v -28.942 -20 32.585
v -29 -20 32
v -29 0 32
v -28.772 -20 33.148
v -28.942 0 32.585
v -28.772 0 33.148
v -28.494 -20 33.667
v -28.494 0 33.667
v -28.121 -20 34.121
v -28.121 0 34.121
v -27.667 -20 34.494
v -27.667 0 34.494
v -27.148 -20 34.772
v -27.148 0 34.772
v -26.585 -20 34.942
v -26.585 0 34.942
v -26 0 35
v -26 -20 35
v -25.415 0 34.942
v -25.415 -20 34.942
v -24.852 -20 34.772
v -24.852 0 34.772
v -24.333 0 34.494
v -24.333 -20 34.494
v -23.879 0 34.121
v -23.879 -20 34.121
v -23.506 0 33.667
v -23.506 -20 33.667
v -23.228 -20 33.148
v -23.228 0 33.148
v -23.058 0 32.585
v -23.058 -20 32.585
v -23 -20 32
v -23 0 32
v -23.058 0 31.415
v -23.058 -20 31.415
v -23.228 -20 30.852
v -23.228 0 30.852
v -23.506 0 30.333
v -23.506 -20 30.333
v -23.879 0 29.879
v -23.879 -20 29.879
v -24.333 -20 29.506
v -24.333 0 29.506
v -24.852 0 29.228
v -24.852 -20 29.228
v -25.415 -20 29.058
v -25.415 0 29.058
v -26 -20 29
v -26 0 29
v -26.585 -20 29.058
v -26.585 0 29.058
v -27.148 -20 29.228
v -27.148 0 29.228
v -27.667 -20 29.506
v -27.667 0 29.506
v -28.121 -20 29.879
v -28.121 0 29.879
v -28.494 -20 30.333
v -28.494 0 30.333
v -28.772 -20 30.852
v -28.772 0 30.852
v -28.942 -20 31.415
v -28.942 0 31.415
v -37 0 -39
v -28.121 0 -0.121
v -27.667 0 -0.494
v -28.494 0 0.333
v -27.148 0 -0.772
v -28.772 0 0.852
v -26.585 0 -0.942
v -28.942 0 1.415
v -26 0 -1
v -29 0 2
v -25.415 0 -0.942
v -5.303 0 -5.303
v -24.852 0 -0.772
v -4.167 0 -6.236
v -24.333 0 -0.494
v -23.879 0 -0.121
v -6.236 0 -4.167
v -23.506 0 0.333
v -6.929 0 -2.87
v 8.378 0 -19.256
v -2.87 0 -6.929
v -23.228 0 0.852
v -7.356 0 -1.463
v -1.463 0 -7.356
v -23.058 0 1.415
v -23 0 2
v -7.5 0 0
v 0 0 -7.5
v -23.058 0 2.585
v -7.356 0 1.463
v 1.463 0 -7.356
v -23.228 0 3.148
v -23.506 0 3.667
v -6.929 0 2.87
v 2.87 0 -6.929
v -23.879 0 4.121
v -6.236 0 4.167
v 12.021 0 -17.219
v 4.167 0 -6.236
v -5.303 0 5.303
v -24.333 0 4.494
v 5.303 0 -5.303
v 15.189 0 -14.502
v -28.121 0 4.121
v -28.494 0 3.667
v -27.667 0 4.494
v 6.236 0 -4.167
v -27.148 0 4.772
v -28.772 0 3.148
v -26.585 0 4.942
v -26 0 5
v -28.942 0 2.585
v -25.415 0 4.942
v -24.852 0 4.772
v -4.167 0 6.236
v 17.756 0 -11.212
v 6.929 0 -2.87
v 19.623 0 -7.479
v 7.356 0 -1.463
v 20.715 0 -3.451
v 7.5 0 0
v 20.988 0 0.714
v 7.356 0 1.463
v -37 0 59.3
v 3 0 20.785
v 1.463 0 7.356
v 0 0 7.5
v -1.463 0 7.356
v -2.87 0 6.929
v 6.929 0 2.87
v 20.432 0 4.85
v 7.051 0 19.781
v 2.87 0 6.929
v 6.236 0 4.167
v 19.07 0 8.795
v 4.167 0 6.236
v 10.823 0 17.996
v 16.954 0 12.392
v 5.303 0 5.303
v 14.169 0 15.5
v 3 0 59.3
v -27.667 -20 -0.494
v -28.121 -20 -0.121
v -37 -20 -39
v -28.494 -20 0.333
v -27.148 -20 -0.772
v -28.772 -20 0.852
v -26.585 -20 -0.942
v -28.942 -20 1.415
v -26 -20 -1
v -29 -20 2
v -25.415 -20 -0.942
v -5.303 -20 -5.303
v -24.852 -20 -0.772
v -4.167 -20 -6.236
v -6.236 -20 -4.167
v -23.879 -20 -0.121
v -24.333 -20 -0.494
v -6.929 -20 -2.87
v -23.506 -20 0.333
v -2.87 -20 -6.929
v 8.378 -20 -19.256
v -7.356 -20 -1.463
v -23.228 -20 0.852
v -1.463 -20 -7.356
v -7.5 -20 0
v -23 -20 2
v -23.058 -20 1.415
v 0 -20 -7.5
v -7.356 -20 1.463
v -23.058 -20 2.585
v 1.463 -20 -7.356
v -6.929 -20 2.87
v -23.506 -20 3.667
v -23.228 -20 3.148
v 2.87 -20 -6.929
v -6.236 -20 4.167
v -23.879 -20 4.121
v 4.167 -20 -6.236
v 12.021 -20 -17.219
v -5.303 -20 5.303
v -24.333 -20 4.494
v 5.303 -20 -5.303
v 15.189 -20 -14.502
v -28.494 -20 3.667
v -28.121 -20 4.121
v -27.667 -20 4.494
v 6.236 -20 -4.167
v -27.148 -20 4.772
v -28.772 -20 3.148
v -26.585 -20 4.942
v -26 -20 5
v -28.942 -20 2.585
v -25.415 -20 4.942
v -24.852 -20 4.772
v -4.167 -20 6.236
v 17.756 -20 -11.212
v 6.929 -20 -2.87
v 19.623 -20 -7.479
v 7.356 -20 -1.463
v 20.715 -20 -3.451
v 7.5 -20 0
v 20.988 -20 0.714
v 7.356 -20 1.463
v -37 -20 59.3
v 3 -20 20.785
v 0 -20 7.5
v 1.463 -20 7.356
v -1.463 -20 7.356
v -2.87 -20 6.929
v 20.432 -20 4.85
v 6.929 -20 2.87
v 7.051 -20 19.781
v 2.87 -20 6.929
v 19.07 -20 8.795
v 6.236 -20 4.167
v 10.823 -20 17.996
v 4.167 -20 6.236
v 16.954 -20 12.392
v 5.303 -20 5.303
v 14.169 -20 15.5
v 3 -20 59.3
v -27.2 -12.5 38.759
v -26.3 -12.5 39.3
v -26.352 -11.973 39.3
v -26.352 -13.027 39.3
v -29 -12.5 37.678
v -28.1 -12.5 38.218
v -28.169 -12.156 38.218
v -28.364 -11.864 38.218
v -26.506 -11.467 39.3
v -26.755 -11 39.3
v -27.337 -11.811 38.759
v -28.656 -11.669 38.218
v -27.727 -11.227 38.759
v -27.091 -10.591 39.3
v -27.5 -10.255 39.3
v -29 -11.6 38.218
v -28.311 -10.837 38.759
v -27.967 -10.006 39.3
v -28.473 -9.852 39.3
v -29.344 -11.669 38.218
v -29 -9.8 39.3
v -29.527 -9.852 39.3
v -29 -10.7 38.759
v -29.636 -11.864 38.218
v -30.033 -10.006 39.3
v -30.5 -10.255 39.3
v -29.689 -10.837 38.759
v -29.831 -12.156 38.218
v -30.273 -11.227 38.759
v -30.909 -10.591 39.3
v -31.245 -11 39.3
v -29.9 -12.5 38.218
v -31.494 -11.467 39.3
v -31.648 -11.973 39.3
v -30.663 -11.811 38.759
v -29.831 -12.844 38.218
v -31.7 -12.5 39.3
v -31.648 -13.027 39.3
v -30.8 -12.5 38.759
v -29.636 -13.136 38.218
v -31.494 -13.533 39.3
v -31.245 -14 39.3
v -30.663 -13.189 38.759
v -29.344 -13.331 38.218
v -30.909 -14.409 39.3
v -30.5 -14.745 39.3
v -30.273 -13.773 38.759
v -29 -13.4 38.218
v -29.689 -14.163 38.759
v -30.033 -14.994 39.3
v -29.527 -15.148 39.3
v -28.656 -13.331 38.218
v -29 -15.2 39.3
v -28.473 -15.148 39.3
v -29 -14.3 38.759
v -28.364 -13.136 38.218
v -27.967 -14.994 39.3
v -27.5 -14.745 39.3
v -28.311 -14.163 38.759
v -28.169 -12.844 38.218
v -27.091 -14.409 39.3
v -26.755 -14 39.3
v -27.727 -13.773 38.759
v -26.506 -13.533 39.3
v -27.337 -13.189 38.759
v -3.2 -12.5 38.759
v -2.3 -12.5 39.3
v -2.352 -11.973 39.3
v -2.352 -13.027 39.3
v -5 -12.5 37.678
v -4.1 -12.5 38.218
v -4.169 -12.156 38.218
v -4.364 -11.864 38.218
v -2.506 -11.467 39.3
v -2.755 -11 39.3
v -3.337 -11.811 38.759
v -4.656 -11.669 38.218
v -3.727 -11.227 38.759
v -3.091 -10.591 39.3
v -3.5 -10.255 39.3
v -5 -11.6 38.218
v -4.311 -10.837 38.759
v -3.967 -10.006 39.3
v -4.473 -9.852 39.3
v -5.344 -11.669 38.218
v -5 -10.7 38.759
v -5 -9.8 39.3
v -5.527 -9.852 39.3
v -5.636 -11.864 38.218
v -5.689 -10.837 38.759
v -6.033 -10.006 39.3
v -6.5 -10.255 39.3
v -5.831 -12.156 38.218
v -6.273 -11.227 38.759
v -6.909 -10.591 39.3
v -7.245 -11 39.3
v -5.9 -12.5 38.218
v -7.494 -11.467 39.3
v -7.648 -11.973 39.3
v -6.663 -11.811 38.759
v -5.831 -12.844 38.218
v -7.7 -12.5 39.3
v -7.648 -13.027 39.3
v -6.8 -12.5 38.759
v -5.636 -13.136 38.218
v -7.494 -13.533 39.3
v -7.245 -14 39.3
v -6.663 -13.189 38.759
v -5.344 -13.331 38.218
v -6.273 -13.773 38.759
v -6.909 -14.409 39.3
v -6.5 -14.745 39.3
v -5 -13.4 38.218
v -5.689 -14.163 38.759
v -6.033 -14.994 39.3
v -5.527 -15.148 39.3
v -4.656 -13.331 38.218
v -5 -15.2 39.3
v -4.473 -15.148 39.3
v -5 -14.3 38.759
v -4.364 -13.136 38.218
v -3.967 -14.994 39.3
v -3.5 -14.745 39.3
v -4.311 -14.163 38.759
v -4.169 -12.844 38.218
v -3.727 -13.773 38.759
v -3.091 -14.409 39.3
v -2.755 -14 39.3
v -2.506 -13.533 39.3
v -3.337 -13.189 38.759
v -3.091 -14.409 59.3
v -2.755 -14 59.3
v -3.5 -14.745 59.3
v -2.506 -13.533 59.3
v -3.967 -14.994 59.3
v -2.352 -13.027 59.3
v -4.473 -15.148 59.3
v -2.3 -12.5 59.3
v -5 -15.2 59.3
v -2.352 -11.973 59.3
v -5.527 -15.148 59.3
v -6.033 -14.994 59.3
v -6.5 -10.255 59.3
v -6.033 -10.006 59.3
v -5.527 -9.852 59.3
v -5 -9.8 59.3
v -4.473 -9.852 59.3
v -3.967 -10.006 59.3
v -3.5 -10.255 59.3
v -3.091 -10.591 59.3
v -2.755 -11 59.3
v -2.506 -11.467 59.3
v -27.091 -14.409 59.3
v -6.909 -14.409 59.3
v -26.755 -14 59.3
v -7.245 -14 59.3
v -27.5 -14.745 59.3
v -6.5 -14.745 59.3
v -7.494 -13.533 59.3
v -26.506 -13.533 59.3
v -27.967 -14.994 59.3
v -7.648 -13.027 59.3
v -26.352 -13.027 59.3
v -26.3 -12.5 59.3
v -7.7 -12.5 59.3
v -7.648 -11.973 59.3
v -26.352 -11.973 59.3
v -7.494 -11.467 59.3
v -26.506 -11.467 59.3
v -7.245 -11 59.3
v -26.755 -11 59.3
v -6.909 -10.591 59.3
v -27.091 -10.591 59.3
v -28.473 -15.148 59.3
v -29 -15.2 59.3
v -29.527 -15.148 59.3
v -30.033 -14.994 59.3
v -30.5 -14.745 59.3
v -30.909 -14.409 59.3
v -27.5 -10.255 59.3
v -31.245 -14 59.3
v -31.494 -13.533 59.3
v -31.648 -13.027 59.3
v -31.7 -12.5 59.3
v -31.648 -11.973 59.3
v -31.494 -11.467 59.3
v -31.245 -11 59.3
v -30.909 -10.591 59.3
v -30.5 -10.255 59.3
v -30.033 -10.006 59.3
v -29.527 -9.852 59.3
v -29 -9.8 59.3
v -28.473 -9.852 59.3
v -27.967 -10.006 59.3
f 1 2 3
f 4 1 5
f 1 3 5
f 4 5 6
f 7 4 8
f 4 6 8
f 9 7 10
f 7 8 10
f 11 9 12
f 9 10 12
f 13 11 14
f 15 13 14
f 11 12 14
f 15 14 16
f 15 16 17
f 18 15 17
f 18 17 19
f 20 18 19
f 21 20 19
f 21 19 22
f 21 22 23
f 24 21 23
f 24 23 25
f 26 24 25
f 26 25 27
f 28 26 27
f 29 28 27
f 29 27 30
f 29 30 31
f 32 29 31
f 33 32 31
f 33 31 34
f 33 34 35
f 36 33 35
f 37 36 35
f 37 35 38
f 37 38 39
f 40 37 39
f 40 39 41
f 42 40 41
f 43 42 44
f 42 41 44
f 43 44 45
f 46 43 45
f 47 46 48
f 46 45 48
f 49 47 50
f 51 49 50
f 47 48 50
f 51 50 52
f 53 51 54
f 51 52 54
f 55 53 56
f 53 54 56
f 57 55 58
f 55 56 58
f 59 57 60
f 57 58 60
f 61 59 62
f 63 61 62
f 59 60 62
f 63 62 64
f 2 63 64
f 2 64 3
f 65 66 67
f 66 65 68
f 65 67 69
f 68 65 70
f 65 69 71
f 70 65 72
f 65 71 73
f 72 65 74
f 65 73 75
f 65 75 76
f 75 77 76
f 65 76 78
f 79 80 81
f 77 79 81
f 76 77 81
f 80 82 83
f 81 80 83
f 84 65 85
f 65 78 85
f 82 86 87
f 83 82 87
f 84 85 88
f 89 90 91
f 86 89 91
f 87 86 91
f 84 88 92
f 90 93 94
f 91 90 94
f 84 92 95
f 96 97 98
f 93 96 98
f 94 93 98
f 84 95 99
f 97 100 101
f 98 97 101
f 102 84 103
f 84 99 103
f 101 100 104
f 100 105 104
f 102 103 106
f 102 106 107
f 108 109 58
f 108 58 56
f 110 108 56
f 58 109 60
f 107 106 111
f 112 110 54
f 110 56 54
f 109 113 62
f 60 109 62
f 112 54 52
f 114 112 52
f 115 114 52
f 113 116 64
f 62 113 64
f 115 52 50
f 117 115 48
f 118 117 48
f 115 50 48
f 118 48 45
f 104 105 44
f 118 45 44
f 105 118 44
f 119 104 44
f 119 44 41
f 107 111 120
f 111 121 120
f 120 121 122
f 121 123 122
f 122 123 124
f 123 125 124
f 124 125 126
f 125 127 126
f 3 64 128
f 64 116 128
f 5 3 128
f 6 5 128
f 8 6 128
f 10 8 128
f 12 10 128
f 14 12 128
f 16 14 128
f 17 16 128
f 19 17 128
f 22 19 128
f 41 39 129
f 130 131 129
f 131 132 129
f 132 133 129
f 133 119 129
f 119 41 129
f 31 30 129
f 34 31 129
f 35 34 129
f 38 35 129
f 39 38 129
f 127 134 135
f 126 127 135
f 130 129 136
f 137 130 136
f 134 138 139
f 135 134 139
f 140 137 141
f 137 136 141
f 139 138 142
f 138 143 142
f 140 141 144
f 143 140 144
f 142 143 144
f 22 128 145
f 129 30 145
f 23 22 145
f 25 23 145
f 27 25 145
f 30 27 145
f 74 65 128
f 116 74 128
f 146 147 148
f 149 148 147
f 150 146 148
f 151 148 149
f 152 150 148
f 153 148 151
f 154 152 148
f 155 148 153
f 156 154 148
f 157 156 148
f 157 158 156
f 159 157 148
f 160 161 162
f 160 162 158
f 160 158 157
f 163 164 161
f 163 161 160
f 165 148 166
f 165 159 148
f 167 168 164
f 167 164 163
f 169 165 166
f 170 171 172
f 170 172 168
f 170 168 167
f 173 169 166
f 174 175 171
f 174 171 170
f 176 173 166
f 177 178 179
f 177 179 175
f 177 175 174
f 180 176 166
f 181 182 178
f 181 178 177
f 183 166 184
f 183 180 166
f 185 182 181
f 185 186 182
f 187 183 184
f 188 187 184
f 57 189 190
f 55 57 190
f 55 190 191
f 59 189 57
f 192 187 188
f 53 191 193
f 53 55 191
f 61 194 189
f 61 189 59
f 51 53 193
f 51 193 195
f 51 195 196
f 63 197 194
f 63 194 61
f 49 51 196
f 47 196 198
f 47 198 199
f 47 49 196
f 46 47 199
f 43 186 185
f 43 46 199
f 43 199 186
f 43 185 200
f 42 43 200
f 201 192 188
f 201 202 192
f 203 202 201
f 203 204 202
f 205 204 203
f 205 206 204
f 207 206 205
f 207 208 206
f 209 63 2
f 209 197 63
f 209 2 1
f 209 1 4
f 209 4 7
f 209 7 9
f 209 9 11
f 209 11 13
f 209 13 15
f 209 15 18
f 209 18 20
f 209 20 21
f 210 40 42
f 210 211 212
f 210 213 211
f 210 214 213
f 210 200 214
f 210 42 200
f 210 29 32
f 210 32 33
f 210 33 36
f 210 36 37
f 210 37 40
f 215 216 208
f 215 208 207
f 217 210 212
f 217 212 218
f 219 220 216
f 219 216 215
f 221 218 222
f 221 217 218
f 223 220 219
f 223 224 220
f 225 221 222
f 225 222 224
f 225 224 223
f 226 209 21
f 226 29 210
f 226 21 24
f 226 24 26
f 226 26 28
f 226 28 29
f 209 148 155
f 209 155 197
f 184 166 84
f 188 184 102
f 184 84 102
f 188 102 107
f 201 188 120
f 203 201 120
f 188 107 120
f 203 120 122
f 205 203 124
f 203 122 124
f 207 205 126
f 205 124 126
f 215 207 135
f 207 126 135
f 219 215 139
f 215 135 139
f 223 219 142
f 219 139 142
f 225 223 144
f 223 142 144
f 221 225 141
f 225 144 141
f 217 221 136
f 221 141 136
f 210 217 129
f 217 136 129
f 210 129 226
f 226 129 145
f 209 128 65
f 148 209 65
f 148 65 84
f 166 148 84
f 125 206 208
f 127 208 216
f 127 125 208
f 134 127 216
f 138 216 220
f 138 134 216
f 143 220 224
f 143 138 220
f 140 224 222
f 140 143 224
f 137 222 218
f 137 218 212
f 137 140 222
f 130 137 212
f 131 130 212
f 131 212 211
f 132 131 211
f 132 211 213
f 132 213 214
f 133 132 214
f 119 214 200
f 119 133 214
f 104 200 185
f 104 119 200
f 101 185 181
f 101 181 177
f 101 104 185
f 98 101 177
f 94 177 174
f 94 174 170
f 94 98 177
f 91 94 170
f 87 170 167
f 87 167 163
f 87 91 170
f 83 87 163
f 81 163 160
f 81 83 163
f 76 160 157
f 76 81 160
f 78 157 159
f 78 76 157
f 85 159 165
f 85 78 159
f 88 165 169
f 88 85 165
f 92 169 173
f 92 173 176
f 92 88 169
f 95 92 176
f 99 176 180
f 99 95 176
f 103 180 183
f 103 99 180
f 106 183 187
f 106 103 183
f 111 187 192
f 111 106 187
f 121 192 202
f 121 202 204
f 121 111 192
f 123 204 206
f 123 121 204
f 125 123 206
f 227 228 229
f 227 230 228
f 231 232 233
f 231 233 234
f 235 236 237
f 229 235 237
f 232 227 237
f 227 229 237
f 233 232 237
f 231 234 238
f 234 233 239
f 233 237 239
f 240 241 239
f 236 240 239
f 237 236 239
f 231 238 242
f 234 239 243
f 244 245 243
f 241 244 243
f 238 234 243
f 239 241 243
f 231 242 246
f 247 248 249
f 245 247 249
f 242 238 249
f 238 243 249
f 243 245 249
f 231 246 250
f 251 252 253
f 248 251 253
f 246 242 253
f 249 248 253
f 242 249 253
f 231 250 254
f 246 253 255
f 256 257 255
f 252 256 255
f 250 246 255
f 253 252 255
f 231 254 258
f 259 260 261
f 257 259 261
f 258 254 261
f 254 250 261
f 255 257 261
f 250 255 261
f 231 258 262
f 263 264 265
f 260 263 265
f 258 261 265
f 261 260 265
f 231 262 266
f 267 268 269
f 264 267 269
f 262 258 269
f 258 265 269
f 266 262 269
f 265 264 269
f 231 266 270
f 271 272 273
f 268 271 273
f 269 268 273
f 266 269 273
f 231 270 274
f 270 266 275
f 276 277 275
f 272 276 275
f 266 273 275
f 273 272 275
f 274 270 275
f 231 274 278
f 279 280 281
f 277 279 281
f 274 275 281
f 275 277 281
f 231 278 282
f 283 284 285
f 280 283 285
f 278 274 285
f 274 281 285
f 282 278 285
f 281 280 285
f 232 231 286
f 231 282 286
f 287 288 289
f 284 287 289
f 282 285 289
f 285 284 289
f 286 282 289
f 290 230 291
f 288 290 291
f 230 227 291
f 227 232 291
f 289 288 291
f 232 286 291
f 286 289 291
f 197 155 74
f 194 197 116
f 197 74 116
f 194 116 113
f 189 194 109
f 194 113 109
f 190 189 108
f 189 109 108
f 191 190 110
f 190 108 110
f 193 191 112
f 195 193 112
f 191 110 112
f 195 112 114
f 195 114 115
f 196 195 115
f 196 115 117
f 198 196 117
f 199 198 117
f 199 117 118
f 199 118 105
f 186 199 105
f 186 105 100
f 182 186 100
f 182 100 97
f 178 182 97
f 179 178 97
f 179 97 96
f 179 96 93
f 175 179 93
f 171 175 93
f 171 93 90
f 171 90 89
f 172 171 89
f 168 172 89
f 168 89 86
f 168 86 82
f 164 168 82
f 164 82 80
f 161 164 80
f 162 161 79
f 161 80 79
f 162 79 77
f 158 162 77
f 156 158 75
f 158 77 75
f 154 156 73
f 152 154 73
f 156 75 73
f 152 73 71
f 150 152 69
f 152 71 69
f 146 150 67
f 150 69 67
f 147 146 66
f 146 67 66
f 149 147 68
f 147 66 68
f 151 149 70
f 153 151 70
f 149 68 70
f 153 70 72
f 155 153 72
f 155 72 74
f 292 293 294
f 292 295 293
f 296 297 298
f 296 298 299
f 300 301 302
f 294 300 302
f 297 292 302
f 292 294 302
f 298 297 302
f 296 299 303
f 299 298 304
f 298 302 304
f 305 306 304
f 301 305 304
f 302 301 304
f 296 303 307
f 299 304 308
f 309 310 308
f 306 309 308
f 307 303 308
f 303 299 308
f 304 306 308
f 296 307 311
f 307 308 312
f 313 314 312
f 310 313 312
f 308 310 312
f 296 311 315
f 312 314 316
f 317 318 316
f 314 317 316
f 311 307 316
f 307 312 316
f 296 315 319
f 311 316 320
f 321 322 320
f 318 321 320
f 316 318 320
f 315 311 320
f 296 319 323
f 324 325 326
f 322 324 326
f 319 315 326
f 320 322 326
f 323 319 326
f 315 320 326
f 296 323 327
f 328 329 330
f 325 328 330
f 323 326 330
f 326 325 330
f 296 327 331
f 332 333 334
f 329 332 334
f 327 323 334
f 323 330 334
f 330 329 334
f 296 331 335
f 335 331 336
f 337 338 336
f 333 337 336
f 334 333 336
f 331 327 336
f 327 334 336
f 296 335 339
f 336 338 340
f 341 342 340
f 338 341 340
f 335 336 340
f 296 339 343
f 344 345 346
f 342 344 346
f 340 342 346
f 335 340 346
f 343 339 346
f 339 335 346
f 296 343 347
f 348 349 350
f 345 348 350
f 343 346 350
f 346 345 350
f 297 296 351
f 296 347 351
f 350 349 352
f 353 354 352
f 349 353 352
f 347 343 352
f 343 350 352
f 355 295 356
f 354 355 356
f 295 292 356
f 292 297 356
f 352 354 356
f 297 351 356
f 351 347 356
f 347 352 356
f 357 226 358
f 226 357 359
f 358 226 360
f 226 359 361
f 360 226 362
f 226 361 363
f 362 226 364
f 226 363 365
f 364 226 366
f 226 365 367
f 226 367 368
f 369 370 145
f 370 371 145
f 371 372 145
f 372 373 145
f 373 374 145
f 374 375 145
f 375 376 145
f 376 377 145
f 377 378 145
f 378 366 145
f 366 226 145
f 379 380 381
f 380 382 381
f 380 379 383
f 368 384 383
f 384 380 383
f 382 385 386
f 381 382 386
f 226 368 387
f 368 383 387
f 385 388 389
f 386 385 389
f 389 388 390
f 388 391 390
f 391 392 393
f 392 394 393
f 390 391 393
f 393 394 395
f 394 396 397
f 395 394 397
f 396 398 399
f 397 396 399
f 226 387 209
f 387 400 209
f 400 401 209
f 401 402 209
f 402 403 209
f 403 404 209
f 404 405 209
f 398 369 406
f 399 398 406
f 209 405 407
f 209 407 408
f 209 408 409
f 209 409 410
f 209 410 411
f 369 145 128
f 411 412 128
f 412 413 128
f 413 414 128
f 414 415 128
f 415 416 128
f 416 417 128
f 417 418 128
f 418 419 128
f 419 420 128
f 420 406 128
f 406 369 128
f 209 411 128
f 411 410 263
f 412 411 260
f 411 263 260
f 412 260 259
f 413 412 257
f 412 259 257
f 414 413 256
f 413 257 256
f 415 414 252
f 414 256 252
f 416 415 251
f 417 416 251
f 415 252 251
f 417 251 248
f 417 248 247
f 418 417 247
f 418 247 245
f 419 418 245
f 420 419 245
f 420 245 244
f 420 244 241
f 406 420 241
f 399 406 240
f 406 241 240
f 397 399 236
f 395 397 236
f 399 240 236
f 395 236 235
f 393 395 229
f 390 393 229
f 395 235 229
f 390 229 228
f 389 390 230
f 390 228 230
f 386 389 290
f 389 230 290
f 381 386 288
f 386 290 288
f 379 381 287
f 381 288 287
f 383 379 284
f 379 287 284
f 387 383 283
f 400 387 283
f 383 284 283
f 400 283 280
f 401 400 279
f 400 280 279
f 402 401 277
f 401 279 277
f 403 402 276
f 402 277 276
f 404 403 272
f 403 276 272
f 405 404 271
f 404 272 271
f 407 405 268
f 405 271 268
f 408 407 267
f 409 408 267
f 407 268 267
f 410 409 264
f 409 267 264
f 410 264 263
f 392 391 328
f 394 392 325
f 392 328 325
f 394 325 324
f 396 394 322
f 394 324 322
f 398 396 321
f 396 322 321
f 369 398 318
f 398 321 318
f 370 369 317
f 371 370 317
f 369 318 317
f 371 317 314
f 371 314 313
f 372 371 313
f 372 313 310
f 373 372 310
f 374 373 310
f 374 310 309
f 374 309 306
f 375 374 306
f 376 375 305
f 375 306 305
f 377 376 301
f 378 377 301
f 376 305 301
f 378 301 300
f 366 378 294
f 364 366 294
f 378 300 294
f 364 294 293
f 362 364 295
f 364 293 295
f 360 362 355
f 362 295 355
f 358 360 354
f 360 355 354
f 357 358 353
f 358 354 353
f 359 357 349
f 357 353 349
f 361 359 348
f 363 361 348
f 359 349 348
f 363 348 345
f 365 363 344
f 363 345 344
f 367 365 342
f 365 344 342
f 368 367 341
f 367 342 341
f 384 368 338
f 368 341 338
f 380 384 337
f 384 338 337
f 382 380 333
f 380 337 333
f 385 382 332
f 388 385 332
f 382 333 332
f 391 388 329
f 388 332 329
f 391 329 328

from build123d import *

# Parameters (mm, degrees)
F0_R     = 7.5
F1_DEPTH = 20
F3_D     = 5.4
F3_DEPTH = 20
F3_TIP   = 1.6223236714
F5_D     = 6


with BuildPart() as f1:
    # F0 (on Front) → F1 (new body)
    with BuildSketch(Plane.XZ):
        with BuildLine():
            Line((-37, -39), (8.3782552843, -19.2562934749))
            ThreePointArc((8.3782552843, -19.2562934749), (20.8130885481, 2.7955938707), (3, 20.7846096908))
            Line((3, 20.7846096908), (3, 59.3))
            Line((3, 59.3), (-37, 59.3))
            Line((-37, 59.3), (-37, -39))
        make_face()
        Circle(F0_R, mode=Mode.SUBTRACT)
    extrude(amount=F1_DEPTH)

    # F3
    with Locations(Plane.XY.offset(59.3)):
        with Locations((-29, -12.5), (-5, -12.5)):
            Hole(F3_D / 2, depth=F3_DEPTH)
            with Locations((0, 0, -(F3_DEPTH + F3_TIP / 2))):  # 118° drill point
                Cone(0, F3_D / 2, F3_TIP, mode=Mode.SUBTRACT)

    # F5 (through all)
    with Locations(Plane.XZ.offset(20)):
        with Locations((-26, 32), (-26, 2)):
            Hole(F5_D / 2)


solid = f1.part
